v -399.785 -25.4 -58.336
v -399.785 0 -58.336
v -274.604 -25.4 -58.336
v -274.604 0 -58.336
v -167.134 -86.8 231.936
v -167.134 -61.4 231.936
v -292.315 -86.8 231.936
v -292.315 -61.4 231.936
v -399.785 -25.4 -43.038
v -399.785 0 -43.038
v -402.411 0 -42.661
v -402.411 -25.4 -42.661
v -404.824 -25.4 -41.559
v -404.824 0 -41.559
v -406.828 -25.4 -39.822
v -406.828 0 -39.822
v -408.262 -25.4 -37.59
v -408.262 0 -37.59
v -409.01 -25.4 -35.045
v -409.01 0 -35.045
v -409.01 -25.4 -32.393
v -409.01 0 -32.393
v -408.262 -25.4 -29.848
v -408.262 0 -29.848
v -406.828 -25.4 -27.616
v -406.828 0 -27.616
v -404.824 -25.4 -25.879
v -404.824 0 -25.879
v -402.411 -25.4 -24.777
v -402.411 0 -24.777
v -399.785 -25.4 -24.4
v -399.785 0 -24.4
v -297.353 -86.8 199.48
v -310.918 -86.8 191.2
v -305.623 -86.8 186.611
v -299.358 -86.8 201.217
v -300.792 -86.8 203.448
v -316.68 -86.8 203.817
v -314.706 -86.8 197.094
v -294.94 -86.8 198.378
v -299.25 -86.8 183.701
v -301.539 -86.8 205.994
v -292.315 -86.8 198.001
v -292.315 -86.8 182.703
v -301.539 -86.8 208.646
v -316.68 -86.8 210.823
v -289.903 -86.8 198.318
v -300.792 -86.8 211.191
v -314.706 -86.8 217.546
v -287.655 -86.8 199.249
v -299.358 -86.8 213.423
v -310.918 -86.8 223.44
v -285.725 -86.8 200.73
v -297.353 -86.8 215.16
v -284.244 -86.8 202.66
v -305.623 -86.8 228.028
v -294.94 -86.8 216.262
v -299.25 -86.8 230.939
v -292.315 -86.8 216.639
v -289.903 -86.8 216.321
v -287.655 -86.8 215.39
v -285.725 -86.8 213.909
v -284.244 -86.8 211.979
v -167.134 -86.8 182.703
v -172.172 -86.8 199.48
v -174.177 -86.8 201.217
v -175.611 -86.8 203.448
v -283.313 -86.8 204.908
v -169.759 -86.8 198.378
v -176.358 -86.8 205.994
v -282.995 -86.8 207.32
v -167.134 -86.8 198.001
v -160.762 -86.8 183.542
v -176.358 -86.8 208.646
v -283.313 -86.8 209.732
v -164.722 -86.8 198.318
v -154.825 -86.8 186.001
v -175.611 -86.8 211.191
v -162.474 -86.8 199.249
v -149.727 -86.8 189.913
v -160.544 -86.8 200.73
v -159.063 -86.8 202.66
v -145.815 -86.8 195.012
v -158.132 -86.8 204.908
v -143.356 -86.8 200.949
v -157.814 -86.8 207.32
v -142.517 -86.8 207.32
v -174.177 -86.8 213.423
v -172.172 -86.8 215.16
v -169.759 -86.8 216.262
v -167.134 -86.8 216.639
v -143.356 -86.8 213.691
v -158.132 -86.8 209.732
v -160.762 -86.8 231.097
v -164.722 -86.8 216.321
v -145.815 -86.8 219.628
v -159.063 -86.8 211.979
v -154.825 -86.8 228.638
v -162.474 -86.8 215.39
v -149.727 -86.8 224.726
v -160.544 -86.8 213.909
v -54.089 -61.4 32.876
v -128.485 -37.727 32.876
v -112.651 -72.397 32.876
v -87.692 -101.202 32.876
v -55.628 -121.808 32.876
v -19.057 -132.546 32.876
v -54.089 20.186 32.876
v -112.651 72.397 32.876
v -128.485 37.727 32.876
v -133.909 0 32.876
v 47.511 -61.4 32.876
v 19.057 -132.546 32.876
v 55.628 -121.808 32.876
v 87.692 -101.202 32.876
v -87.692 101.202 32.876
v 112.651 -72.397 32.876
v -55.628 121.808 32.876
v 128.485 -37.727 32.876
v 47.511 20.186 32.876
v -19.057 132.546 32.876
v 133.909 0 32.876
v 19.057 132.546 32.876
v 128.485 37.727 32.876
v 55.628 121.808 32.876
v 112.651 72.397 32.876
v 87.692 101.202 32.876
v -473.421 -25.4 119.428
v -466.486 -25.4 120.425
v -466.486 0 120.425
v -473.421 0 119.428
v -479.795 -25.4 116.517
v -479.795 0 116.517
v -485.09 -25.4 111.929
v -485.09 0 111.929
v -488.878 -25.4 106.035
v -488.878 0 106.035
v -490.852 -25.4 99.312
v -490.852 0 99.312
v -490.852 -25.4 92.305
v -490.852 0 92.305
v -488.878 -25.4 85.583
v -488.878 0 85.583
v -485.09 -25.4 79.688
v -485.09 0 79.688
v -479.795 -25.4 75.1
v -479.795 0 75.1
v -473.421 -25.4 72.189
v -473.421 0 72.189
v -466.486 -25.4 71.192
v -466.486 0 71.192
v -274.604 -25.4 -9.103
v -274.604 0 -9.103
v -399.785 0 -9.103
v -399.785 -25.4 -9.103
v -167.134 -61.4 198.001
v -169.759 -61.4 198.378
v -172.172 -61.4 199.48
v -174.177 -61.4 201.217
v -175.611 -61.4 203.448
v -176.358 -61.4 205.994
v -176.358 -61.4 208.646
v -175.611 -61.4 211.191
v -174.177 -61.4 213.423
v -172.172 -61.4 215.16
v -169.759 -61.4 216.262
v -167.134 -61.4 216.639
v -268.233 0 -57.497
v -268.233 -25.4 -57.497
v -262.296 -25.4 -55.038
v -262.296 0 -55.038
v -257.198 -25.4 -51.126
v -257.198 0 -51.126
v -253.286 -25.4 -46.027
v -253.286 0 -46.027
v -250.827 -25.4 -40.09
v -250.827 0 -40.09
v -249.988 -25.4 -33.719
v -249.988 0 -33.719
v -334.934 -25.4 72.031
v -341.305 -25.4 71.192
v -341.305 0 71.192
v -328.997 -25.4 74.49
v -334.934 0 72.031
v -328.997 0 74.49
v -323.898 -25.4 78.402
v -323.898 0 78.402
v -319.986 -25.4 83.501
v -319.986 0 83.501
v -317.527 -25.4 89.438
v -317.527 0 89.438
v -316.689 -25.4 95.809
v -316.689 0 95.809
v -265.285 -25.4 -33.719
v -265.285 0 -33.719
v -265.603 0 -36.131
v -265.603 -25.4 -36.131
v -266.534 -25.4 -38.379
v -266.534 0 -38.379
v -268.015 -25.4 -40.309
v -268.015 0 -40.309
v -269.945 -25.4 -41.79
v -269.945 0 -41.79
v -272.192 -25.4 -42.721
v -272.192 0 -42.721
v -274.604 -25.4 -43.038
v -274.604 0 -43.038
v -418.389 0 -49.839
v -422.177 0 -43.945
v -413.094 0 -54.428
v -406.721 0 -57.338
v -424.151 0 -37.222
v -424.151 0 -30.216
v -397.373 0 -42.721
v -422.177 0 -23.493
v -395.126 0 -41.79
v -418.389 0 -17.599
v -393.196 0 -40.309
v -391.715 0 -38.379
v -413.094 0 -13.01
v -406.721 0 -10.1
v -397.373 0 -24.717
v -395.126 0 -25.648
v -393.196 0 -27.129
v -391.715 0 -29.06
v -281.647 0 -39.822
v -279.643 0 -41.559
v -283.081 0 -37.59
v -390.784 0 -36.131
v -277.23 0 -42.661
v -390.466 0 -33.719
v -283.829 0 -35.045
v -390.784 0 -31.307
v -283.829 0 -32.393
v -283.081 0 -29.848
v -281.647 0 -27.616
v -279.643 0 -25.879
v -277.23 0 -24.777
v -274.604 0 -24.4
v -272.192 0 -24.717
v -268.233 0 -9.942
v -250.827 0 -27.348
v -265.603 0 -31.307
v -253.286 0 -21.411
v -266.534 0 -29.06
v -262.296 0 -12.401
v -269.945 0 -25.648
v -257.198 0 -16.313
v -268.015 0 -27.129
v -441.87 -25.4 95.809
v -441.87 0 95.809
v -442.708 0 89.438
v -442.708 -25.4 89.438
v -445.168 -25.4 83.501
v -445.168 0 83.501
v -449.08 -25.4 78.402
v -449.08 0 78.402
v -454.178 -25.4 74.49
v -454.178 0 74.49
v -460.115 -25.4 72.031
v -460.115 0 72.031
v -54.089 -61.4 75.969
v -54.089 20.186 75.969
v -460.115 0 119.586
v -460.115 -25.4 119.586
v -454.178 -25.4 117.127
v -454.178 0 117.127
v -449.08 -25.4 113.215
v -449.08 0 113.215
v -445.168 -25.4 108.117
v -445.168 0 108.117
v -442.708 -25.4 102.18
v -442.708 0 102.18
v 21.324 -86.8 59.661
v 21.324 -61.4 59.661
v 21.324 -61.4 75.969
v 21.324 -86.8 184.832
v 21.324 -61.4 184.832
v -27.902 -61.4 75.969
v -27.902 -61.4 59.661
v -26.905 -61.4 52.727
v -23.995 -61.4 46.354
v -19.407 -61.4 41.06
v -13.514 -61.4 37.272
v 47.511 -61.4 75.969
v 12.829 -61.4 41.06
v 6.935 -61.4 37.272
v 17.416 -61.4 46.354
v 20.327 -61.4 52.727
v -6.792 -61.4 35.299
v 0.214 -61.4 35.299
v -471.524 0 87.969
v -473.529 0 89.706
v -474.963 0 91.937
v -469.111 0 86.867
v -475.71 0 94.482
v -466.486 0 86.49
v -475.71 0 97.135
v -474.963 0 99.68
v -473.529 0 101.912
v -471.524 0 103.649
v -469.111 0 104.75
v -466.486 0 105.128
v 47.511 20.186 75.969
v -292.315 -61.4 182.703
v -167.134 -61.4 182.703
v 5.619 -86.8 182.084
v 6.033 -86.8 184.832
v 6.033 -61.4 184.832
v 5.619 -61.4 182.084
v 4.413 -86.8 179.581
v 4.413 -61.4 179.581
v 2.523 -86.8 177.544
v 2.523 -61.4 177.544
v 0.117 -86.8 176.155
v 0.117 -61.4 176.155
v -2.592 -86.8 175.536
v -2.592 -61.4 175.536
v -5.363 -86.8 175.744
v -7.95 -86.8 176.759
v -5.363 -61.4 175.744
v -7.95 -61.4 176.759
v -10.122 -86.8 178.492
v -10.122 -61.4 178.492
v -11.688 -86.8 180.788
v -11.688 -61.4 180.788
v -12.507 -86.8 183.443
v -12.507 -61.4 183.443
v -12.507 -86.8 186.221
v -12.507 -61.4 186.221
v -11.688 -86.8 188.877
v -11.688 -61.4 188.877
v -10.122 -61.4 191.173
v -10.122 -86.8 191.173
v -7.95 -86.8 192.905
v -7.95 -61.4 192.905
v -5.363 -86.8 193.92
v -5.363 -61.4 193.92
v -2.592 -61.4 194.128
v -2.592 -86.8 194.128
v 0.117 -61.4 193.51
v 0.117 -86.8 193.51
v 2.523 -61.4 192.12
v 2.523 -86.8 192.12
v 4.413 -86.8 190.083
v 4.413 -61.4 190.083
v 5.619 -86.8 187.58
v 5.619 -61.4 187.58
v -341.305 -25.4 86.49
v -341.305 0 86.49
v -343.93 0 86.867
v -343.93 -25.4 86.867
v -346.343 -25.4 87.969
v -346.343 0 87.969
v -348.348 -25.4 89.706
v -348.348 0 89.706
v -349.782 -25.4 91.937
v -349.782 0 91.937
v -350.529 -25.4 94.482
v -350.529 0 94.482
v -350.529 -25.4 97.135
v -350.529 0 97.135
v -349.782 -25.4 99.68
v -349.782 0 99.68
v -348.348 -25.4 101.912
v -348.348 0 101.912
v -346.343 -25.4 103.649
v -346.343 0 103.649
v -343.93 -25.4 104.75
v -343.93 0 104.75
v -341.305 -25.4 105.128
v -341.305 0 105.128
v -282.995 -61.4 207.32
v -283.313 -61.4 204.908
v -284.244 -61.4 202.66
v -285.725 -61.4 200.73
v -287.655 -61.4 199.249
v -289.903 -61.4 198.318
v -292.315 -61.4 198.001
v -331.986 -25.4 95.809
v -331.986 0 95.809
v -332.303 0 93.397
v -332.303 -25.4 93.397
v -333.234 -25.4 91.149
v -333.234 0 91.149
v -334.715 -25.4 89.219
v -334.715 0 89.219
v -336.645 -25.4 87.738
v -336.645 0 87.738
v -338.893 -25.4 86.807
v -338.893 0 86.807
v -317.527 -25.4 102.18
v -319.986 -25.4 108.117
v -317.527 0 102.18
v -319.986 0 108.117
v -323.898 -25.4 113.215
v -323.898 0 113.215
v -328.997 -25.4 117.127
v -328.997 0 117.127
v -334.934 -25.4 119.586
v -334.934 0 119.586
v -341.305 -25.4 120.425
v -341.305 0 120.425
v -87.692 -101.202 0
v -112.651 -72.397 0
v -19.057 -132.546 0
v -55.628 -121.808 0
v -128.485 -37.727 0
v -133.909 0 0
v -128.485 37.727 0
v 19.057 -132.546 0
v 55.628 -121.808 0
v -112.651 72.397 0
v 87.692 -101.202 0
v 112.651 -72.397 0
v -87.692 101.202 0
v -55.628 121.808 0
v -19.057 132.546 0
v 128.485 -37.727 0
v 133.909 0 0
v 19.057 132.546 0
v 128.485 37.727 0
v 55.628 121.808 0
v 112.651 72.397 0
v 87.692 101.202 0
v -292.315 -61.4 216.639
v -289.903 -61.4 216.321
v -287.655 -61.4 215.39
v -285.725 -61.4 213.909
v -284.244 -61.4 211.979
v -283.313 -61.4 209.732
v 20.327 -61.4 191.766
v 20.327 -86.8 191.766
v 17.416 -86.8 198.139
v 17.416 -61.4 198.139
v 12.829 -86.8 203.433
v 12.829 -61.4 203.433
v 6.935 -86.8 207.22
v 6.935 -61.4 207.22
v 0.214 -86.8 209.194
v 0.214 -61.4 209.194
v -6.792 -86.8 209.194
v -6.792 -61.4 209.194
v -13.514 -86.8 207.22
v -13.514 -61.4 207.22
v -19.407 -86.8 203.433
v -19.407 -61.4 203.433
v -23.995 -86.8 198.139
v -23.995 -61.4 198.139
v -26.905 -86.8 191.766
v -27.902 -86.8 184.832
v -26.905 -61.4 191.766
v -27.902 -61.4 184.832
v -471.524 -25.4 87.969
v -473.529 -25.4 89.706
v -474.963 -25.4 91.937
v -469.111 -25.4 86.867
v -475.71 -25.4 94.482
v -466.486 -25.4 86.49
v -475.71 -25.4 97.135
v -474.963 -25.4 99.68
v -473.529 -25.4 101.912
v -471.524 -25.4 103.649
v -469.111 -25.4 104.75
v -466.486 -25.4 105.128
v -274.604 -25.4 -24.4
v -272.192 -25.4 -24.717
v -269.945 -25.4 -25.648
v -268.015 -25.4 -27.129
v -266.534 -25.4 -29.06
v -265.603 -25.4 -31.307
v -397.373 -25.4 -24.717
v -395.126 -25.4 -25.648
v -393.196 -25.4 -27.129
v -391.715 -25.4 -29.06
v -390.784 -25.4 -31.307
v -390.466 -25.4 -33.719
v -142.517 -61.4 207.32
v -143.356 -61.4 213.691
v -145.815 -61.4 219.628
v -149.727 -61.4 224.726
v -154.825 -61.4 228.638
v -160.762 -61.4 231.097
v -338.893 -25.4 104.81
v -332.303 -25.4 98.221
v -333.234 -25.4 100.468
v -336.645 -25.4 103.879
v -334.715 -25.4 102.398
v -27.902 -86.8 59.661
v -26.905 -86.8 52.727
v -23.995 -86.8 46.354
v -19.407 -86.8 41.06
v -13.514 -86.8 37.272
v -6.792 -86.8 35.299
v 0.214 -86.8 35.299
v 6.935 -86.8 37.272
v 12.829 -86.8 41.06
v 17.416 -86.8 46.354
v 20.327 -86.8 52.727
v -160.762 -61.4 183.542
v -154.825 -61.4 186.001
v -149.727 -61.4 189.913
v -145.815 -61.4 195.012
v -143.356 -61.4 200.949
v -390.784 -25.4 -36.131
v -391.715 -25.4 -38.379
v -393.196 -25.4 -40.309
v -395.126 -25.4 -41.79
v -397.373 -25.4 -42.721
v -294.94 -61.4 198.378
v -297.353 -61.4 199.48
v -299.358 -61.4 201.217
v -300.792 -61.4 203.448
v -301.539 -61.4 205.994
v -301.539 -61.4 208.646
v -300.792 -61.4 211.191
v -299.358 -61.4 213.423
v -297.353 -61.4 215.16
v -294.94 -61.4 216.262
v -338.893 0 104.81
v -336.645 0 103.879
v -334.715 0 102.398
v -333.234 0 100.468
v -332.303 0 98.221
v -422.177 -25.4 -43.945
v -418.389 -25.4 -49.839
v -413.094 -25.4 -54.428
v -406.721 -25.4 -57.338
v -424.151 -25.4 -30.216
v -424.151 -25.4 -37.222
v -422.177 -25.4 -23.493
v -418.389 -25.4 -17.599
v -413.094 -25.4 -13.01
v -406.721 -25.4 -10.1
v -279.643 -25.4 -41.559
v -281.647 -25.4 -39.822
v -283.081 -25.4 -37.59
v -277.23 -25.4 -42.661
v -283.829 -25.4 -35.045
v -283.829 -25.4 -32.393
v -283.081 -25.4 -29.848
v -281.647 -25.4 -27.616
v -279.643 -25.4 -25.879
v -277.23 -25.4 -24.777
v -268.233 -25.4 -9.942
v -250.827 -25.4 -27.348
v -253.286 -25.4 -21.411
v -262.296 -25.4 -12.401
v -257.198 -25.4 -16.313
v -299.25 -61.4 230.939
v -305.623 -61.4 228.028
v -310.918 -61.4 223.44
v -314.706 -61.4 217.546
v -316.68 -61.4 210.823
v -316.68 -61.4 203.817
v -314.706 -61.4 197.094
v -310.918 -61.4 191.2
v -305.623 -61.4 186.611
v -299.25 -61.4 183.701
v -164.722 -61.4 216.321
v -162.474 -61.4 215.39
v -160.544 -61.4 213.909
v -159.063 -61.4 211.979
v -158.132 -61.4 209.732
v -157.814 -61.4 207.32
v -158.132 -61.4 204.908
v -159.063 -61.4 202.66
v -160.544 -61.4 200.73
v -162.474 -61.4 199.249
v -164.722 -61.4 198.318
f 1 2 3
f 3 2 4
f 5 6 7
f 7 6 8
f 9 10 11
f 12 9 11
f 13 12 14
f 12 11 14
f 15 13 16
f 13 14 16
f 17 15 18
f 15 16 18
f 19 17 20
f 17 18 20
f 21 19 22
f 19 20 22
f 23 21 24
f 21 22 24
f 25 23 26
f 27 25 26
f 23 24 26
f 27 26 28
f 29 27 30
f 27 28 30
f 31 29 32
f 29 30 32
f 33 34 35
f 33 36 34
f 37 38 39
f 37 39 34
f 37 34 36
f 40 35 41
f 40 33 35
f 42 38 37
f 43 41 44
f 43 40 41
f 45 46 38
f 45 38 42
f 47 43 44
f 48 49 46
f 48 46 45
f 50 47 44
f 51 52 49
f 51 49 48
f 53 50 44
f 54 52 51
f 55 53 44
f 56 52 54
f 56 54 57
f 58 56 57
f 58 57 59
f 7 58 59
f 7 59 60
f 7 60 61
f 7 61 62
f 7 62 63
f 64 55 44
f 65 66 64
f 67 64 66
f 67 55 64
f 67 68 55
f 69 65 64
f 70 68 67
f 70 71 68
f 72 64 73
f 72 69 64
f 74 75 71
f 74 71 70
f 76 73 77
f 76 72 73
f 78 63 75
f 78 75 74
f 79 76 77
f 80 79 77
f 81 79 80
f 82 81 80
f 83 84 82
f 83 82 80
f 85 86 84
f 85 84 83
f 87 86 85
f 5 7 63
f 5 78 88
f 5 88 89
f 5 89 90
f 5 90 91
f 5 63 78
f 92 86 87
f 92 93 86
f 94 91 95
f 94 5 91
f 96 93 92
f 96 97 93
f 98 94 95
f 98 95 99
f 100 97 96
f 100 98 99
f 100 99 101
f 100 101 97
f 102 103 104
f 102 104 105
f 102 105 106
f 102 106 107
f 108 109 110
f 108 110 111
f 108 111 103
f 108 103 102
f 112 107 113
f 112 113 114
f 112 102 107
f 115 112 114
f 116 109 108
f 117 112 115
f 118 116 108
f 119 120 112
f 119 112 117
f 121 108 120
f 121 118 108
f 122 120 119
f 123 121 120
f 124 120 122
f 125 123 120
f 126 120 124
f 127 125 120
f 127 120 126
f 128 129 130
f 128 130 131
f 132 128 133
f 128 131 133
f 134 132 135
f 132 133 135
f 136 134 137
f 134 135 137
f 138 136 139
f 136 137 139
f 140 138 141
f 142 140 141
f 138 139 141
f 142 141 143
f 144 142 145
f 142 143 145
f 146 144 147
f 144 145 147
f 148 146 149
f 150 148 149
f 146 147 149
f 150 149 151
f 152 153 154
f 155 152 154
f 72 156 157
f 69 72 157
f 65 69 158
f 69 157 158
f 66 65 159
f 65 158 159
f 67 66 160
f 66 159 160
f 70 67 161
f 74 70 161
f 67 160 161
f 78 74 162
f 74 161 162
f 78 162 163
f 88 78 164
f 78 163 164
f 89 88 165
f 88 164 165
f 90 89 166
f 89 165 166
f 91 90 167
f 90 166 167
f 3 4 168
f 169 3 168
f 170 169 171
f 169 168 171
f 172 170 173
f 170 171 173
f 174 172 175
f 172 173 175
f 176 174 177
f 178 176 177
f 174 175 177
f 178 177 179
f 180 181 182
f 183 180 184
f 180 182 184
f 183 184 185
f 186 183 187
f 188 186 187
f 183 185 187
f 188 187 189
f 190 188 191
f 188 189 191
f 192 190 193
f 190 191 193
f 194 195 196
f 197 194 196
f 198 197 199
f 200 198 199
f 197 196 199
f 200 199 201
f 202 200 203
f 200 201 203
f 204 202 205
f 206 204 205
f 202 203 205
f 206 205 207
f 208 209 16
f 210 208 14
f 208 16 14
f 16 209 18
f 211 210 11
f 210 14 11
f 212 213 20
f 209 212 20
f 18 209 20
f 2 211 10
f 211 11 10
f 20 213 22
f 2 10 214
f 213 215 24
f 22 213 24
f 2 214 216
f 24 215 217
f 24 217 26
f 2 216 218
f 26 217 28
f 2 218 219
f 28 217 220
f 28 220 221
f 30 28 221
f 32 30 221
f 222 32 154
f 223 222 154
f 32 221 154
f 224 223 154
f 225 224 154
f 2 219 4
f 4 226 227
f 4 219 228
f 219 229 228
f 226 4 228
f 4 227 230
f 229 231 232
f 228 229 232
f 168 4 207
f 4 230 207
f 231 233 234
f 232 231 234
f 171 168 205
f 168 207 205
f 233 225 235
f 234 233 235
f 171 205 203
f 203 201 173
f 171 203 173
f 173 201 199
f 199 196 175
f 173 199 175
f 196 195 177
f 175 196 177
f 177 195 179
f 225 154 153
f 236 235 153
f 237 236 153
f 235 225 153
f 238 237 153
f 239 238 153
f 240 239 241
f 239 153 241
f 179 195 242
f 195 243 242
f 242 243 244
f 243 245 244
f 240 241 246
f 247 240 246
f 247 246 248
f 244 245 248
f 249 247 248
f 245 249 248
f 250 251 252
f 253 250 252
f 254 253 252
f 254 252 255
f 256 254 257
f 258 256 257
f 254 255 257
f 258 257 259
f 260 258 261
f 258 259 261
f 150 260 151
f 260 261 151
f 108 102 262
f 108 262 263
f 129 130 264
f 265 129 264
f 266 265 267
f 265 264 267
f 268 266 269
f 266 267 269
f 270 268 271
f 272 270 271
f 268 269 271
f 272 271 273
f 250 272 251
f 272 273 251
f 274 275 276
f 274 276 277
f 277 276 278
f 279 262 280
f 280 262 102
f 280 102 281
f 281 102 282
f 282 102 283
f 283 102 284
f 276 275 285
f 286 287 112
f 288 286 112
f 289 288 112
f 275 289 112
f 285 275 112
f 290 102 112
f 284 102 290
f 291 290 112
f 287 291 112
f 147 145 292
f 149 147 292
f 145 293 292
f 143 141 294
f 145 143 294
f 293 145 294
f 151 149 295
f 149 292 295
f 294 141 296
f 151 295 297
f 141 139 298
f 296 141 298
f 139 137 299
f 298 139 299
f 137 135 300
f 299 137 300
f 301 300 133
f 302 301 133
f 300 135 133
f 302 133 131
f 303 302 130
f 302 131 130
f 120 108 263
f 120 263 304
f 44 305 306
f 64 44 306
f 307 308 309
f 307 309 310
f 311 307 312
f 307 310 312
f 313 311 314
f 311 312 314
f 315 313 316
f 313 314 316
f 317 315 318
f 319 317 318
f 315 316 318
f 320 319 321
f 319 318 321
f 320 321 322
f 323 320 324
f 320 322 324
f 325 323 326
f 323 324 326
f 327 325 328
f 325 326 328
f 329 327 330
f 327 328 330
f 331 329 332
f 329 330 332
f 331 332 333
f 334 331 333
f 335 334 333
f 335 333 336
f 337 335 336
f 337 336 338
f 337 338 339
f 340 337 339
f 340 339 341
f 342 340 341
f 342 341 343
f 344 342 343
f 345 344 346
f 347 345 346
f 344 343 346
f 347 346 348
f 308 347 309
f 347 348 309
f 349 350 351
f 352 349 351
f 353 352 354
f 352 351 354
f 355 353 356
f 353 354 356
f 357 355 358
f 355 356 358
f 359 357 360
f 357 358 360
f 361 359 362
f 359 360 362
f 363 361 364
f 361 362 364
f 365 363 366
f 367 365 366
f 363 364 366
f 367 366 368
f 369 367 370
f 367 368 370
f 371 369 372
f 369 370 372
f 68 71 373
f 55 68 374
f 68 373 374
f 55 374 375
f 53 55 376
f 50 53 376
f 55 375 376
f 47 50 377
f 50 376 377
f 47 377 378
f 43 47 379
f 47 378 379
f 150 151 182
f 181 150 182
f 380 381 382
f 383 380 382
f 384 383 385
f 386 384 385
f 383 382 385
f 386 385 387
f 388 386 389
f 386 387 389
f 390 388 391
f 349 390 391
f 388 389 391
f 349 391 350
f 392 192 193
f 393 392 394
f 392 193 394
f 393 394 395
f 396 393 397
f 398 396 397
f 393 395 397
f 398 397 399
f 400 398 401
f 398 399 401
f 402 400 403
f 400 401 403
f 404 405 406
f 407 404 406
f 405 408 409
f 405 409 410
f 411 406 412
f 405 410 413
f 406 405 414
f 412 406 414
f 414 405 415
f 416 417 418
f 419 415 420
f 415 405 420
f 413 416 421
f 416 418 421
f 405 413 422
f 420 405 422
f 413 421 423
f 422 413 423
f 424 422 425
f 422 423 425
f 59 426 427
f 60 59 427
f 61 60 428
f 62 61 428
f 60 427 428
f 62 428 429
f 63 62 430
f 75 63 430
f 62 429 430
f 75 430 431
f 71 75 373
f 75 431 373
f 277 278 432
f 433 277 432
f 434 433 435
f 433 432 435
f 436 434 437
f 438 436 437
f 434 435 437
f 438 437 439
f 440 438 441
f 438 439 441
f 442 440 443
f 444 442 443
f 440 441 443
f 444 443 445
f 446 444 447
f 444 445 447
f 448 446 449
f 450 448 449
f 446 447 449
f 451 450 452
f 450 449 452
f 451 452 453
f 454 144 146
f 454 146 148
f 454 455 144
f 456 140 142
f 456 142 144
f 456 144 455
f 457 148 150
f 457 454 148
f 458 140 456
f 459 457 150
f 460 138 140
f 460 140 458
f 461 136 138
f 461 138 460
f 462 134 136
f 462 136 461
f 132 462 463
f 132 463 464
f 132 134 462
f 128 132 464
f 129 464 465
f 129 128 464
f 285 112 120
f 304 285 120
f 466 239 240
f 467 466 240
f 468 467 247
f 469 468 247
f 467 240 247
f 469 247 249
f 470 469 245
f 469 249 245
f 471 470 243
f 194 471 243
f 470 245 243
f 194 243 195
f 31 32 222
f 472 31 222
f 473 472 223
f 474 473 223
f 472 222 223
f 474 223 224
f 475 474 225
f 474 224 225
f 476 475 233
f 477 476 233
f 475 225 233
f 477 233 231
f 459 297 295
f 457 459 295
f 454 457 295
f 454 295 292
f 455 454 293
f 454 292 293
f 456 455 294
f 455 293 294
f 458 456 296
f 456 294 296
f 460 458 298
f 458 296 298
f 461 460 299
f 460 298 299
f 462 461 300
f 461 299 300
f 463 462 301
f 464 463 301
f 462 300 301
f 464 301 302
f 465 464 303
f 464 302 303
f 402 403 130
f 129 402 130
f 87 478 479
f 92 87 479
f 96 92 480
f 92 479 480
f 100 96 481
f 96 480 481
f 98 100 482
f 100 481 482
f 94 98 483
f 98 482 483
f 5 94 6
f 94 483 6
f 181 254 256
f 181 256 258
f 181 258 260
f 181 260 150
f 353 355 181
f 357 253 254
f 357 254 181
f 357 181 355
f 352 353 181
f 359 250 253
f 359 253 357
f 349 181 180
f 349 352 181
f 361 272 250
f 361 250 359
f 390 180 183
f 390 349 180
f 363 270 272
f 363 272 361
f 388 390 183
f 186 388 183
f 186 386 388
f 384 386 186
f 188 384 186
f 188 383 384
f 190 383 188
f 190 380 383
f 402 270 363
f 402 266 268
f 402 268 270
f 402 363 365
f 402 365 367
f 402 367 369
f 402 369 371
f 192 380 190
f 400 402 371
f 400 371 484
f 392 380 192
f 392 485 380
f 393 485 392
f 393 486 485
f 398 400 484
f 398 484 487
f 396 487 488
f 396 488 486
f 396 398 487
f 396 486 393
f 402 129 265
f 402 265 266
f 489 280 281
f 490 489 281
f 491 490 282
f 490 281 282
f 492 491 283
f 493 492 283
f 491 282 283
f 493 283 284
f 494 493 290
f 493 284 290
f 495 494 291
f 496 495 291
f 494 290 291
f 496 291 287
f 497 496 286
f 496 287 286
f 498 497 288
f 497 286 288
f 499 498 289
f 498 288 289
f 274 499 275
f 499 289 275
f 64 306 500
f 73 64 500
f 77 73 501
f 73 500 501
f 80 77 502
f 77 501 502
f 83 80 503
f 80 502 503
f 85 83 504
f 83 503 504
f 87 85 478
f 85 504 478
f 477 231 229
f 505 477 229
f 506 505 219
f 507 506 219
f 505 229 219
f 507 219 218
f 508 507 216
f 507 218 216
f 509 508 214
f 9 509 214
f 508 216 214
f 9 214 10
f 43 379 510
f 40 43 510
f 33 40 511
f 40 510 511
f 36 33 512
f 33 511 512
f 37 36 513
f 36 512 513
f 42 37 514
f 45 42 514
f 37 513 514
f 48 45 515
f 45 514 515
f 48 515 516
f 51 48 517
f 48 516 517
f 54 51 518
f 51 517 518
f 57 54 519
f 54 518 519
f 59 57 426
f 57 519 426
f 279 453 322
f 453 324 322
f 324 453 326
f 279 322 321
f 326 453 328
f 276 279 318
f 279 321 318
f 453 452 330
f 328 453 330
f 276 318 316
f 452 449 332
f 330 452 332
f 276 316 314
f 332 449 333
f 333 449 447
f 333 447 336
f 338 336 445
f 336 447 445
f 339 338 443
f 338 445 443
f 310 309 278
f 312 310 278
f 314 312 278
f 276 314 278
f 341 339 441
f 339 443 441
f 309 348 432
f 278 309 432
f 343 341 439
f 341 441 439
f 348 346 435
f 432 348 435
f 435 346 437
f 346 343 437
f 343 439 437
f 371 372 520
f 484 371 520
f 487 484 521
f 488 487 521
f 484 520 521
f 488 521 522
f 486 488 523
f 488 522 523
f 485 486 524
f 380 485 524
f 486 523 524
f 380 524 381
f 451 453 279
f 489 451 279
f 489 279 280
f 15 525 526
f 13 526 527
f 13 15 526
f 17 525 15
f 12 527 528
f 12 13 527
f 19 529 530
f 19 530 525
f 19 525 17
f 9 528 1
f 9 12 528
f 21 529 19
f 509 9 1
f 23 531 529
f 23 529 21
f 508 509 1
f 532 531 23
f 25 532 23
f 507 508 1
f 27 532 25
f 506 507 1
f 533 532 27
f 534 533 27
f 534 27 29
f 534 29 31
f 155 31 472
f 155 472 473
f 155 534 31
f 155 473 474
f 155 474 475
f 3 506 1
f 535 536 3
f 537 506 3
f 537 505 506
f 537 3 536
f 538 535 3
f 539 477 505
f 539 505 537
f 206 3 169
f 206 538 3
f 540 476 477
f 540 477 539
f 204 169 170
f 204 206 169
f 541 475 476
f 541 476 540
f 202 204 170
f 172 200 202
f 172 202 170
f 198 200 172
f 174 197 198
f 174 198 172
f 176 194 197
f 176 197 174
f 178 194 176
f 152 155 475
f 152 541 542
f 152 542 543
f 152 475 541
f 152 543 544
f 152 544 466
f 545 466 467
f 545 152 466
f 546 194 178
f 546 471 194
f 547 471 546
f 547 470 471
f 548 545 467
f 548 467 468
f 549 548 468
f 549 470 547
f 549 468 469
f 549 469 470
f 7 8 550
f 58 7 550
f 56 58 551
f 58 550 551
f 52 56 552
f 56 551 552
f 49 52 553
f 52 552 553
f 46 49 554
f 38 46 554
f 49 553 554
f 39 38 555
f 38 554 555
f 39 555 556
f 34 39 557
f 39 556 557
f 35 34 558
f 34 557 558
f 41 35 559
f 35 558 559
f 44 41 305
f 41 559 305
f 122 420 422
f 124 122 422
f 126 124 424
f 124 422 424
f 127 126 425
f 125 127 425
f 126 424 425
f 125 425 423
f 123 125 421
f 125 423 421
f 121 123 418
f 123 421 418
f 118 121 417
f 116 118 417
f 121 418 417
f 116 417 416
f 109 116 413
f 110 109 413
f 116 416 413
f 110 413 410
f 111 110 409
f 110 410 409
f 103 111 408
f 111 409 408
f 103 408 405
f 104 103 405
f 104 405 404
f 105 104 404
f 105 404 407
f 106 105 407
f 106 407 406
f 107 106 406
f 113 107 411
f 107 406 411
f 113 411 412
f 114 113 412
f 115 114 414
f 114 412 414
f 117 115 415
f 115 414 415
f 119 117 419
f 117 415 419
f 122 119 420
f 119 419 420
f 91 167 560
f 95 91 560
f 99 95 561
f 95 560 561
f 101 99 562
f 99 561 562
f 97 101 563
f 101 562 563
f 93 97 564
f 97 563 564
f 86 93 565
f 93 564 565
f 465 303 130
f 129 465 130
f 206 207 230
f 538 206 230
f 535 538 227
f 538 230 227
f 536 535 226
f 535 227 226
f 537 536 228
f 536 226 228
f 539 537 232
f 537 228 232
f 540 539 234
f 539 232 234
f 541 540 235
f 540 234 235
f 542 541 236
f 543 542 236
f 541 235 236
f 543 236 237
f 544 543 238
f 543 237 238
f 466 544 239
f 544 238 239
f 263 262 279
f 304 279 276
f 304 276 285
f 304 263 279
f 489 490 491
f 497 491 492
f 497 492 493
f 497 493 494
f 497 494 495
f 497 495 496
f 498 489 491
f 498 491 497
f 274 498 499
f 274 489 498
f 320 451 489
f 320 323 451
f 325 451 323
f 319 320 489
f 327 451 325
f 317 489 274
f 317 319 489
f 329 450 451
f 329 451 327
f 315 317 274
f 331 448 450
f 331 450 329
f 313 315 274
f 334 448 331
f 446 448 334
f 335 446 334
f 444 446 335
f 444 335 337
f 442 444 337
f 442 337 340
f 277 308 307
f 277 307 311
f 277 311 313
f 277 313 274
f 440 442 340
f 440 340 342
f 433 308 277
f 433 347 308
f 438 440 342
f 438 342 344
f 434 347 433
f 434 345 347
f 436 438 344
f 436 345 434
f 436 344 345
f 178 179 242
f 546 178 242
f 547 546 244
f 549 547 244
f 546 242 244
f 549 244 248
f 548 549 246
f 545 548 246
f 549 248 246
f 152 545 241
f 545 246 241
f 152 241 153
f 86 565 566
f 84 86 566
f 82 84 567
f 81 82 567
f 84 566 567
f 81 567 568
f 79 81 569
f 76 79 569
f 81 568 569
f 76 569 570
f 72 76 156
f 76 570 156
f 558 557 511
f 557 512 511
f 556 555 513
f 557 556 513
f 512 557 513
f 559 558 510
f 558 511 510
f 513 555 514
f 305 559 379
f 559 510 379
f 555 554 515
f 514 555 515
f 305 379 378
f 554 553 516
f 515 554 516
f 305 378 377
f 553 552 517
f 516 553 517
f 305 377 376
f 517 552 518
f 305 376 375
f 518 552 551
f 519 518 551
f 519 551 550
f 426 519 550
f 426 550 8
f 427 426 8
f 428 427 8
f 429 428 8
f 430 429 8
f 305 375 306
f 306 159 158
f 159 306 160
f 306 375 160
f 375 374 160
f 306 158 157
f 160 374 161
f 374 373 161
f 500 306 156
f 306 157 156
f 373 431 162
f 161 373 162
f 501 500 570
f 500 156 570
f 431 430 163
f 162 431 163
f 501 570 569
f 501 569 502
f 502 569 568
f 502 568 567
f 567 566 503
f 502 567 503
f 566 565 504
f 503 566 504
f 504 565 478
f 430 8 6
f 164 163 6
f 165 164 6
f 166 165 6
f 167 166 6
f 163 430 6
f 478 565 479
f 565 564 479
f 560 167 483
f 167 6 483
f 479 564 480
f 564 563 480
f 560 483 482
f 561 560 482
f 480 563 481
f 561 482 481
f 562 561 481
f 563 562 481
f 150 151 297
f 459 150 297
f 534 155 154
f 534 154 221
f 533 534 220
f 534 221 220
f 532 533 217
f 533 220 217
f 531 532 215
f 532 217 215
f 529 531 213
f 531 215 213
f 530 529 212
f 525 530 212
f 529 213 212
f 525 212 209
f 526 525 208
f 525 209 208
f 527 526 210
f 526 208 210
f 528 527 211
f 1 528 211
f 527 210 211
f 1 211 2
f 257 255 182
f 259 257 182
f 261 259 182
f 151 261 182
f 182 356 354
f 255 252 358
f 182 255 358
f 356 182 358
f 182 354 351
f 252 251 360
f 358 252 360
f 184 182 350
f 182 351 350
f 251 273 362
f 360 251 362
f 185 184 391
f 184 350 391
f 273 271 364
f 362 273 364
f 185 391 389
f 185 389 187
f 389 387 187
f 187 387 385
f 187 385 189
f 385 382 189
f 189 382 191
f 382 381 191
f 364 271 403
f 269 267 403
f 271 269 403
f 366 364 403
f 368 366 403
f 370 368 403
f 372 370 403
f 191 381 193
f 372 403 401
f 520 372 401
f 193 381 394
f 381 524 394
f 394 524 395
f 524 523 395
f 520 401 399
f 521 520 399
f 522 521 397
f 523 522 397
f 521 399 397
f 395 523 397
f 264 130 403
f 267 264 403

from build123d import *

# Parameters (mm, degrees)
F1_DEPTH = 25.4
F2_R     = 133.9090353396
F3_DEPTH = 32.8763
F4_W     = 101.6
F4_H     = 81.5856331369
F5_DEPTH = 43.0923
F7_DEPTH = 25.4


with BuildPart() as f1:
    # F0 (on Front) → F1 (new body)
    with BuildSketch(Plane.XZ):
        with BuildLine():
            ThreePointArc((-375.1689102501, -33.7191261351), (-382.3788868172, -16.3127029223), (-399.78531003, -9.1027263552))
            Line((-399.78531003, -9.1027263552), (-399.78531003, -24.3999422365))
            ThreePointArc((-399.78531003, -24.3999422365), (-393.1956519002, -27.1294680053), (-390.4661261314, -33.7191261351))
            ThreePointArc((-390.4661261314, -33.7191261351), (-393.1956519002, -40.3087842649), (-399.78531003, -43.0383100337))
            Line((-399.78531003, -43.0383100337), (-399.78531003, -58.335525915))
            ThreePointArc((-399.78531003, -58.335525915), (-382.3788868172, -51.1255493479), (-375.1689102501, -33.7191261351))
        make_face()
        with BuildLine():
            Line((-274.6042609215, -9.1027263552), (-399.78531003, -9.1027263552))
            ThreePointArc((-399.78531003, -9.1027263552), (-382.3788868172, -16.3127029223), (-375.1689102501, -33.7191261351))
            ThreePointArc((-375.1689102501, -33.7191261351), (-382.3788868172, -51.1255493479), (-399.78531003, -58.335525915))
            Line((-399.78531003, -58.335525915), (-274.6042609215, -58.335525915))
            ThreePointArc((-274.6042609215, -58.335525915), (-299.2206607014, -33.7191261351), (-274.6042609215, -9.1027263552))
        make_face()
        with BuildLine():
            Line((-399.78531003, -24.3999422365), (-399.78531003, -9.1027263552))
            ThreePointArc((-399.78531003, -9.1027263552), (-424.4017098099, -33.7191261351), (-399.78531003, -58.335525915))
            Line((-399.78531003, -58.335525915), (-399.78531003, -43.0383100337))
            ThreePointArc((-399.78531003, -43.0383100337), (-409.1044939286, -33.7191261351), (-399.78531003, -24.3999422365))
        make_face()
        with BuildLine():
            ThreePointArc((-249.9878611416, -33.7191261351), (-257.1978377087, -16.3127029223), (-274.6042609215, -9.1027263552))
            Line((-274.6042609215, -9.1027263552), (-274.6042609215, -24.3999422365))
            ThreePointArc((-274.6042609215, -24.3999422365), (-268.0146027917, -27.1294680053), (-265.2850770229, -33.7191261351))
            ThreePointArc((-265.2850770229, -33.7191261351), (-268.0146027917, -40.3087842649), (-274.6042609215, -43.0383100337))
            Line((-274.6042609215, -43.0383100337), (-274.6042609215, -58.335525915))
            ThreePointArc((-274.6042609215, -58.335525915), (-257.1978377087, -51.1255493479), (-249.9878611416, -33.7191261351))
        make_face()
        with BuildLine():
            Line((-274.6042609215, -24.3999422365), (-274.6042609215, -9.1027263552))
            ThreePointArc((-274.6042609215, -9.1027263552), (-299.2206607014, -33.7191261351), (-274.6042609215, -58.335525915))
            Line((-274.6042609215, -58.335525915), (-274.6042609215, -43.0383100337))
            ThreePointArc((-274.6042609215, -43.0383100337), (-283.9234448201, -33.7191261351), (-274.6042609215, -24.3999422365))
        make_face()
    extrude(amount=F1_DEPTH)


with BuildPart() as f1b:
    # F0 (on Front) → F1, piece 2 (new body)
    with BuildSketch(Plane.XZ):
        with BuildLine():
            Line((-341.3049131632, 120.4251348972), (-466.4859622717, 120.4251348972))
            ThreePointArc((-466.4859622717, 120.4251348972), (-449.0795390589, 113.2151583301), (-441.8695624918, 95.8087351173))
            ThreePointArc((-441.8695624918, 95.8087351173), (-449.0795390589, 78.4023119045), (-466.4859622717, 71.1923353374))
            Line((-466.4859622717, 71.1923353374), (-341.3049131632, 71.1923353374))
            ThreePointArc((-341.3049131632, 71.1923353374), (-365.9213129431, 95.8087351173), (-341.3049131632, 120.4251348972))
        make_face()
        with BuildLine():
            ThreePointArc((-316.6885133833, 95.8087351173), (-323.8984899504, 113.2151583301), (-341.3049131632, 120.4251348972))
            Line((-341.3049131632, 120.4251348972), (-341.3049131632, 105.1279190159))
            ThreePointArc((-341.3049131632, 105.1279190159), (-334.7152550334, 102.3983932471), (-331.9857292646, 95.8087351173))
            ThreePointArc((-331.9857292646, 95.8087351173), (-334.7152550334, 89.2190769875), (-341.3049131632, 86.4895512187))
            Line((-341.3049131632, 86.4895512187), (-341.3049131632, 71.1923353374))
            ThreePointArc((-341.3049131632, 71.1923353374), (-323.8984899504, 78.4023119045), (-316.6885133833, 95.8087351173))
        make_face()
        with BuildLine():
            Line((-341.3049131632, 105.1279190159), (-341.3049131632, 120.4251348972))
            ThreePointArc((-341.3049131632, 120.4251348972), (-365.9213129431, 95.8087351173), (-341.3049131632, 71.1923353374))
            Line((-341.3049131632, 71.1923353374), (-341.3049131632, 86.4895512187))
            ThreePointArc((-341.3049131632, 86.4895512187), (-350.6240970618, 95.8087351173), (-341.3049131632, 105.1279190159))
        make_face()
    extrude(amount=F1_DEPTH)


with BuildPart() as f1c:
    # F0 (on Front) → F1, piece 3 (new body)
    with BuildSketch(Plane.XZ):
        with BuildLine():
            Line((-466.4859622717, 105.1279190159), (-466.4859622717, 120.4251348972))
            ThreePointArc((-466.4859622717, 120.4251348972), (-491.1023620516, 95.8087351173), (-466.4859622717, 71.1923353374))
            Line((-466.4859622717, 71.1923353374), (-466.4859622717, 86.4895512187))
            ThreePointArc((-466.4859622717, 86.4895512187), (-475.8051461703, 95.8087351173), (-466.4859622717, 105.1279190159))
        make_face()
    extrude(amount=F1_DEPTH)


with BuildPart() as f3:
    # F2 (on Top) → F3 (new body)
    with BuildSketch(Plane.XY):
        Circle(F2_R)
    extrude(amount=F3_DEPTH)

    # F4 (on face) → F5 (join)
    with BuildSketch(Plane.XY.offset(32.8763)):
        with Locations((-3.2890904695, -20.6068744883)):
            Rectangle(F4_W, F4_H)
    extrude(amount=F5_DEPTH)

    # F6 (on face) → F7, piece 2 (join)
    with BuildSketch(Plane.XZ.offset(61.3996910568)):
        with BuildLine():
            Line((6.0327095305, 184.8320817577), (21.3235095305, 184.8320817577))
            ThreePointArc((21.3235095305, 184.8320817577), (-3.2890904695, 209.4446817577), (-27.9016904695, 184.8320817577))
            Line((-27.9016904695, 184.8320817577), (-12.6108904695, 184.8320817577))
            ThreePointArc((-12.6108904695, 184.8320817577), (-3.2890904695, 194.1538817577), (6.0327095305, 184.8320817577))
        make_face()
        with BuildLine():
            ThreePointArc((-27.9016904695, 184.8320817577), (-3.2890904695, 160.2194817577), (21.3235095305, 184.8320817577))
            Line((21.3235095305, 184.8320817577), (6.0327095305, 184.8320817577))
            ThreePointArc((6.0327095305, 184.8320817577), (-3.2890904695, 175.5102817577), (-12.6108904695, 184.8320817577))
            Line((-12.6108904695, 184.8320817577), (-27.9016904695, 184.8320817577))
        make_face()
        with BuildLine():
            Line((-21.7237969898, 75.9686), (15.1456160509, 75.9686))
            ThreePointArc((15.1456160509, 75.9686), (-3.2890904695, 84.2734817577), (-21.7237969898, 75.9686))
        make_face()
        with BuildLine():
            Line((-27.9016904695, 75.9686), (-27.9016904695, 59.6608817577))
            ThreePointArc((-27.9016904695, 59.6608817577), (-26.3054556958, 68.3802286673), (-21.7237969898, 75.9686))
            Line((-21.7237969898, 75.9686), (-27.9016904695, 75.9686))
        make_face()
        with BuildLine():
            ThreePointArc((15.1456160509, 75.9686), (19.7272747568, 68.3802286673), (21.3235095305, 59.6608817577))
            Line((21.3235095305, 59.6608817577), (21.3235095305, 75.9686))
            Line((21.3235095305, 75.9686), (15.1456160509, 75.9686))
        make_face()
        with BuildLine():
            ThreePointArc((-12.6108904695, 59.6608817577), (-3.2890904695, 68.9826817577), (6.0327095305, 59.6608817577))
            Line((6.0327095305, 59.6608817577), (21.3235095305, 59.6608817577))
            ThreePointArc((21.3235095305, 59.6608817577), (19.7272747568, 68.3802286673), (15.1456160509, 75.9686))
            Line((15.1456160509, 75.9686), (-21.7237969898, 75.9686))
            ThreePointArc((-21.7237969898, 75.9686), (-26.3054556958, 68.3802286673), (-27.9016904695, 59.6608817577))
            Line((-27.9016904695, 59.6608817577), (-12.6108904695, 59.6608817577))
        make_face()
        with BuildLine():
            Line((15.1456160509, 75.9686), (21.3235095305, 75.9686))
            Line((21.3235095305, 75.9686), (21.3235095305, 184.8320817577))
            ThreePointArc((21.3235095305, 184.8320817577), (-3.2890904695, 160.2194817577), (-27.9016904695, 184.8320817577))
            Line((-27.9016904695, 184.8320817577), (-27.9016904695, 75.9686))
            Line((-27.9016904695, 75.9686), (-21.7237969898, 75.9686))
            ThreePointArc((-21.7237969898, 75.9686), (-3.2890904695, 84.2734817577), (15.1456160509, 75.9686))
        make_face()
        with BuildLine():
            Line((21.3235095305, 59.6608817577), (6.0327095305, 59.6608817577))
            ThreePointArc((6.0327095305, 59.6608817577), (-3.2890904695, 50.3390817577), (-12.6108904695, 59.6608817577))
            Line((-12.6108904695, 59.6608817577), (-27.9016904695, 59.6608817577))
            ThreePointArc((-27.9016904695, 59.6608817577), (-3.2890904695, 35.0482817577), (21.3235095305, 59.6608817577))
        make_face()
        with BuildLine():
            Line((-12.6108904695, 59.6608817577), (6.0327095305, 59.6608817577))
            ThreePointArc((6.0327095305, 59.6608817577), (-3.2890904695, 68.9826817577), (-12.6108904695, 59.6608817577))
        make_face()
        with BuildLine():
            ThreePointArc((-12.6108904695, 59.6608817577), (-3.2890904695, 50.3390817577), (6.0327095305, 59.6608817577))
            Line((6.0327095305, 59.6608817577), (-12.6108904695, 59.6608817577))
        make_face()
    extrude(amount=F7_DEPTH)


with BuildPart() as f7:
    # F6 (on face) → F7 (new body)
    with BuildSketch(Plane.XZ.offset(61.3996910568)):
        with BuildLine():
            ThreePointArc((-292.314581573, 198.0006345385), (-301.6337654716, 207.3198184371), (-292.314581573, 216.6390023357))
            Line((-292.314581573, 216.6390023357), (-292.314581573, 231.936218217))
            ThreePointArc((-292.314581573, 231.936218217), (-316.9309813529, 207.3198184371), (-292.314581573, 182.7034186572))
            Line((-292.314581573, 182.7034186572), (-292.314581573, 198.0006345385))
        make_face()
        with BuildLine():
            Line((-167.1335324645, 231.936218217), (-292.314581573, 231.936218217))
            ThreePointArc((-292.314581573, 231.936218217), (-274.9081583602, 224.7262416499), (-267.6981817931, 207.3198184371))
            ThreePointArc((-267.6981817931, 207.3198184371), (-274.9081583602, 189.9133952243), (-292.314581573, 182.7034186572))
            Line((-292.314581573, 182.7034186572), (-167.1335324645, 182.7034186572))
            ThreePointArc((-167.1335324645, 182.7034186572), (-191.7499322444, 207.3198184371), (-167.1335324645, 231.936218217))
        make_face()
        with BuildLine():
            ThreePointArc((-142.5171326846, 207.3198184371), (-149.7271092517, 224.7262416499), (-167.1335324645, 231.936218217))
            Line((-167.1335324645, 231.936218217), (-167.1335324645, 216.6390023357))
            ThreePointArc((-167.1335324645, 216.6390023357), (-160.5438743347, 213.9094765669), (-157.8143485659, 207.3198184371))
            ThreePointArc((-157.8143485659, 207.3198184371), (-160.5438743347, 200.7301603073), (-167.1335324645, 198.0006345385))
            Line((-167.1335324645, 198.0006345385), (-167.1335324645, 182.7034186572))
            ThreePointArc((-167.1335324645, 182.7034186572), (-149.7271092517, 189.9133952243), (-142.5171326846, 207.3198184371))
        make_face()
        with BuildLine():
            ThreePointArc((-292.314581573, 216.6390023357), (-285.7249234432, 213.9094765669), (-282.9953976744, 207.3198184371))
            ThreePointArc((-282.9953976744, 207.3198184371), (-285.7249234432, 200.7301603073), (-292.314581573, 198.0006345385))
            Line((-292.314581573, 198.0006345385), (-292.314581573, 182.7034186572))
            ThreePointArc((-292.314581573, 182.7034186572), (-274.9081583602, 189.9133952243), (-267.6981817931, 207.3198184371))
            ThreePointArc((-267.6981817931, 207.3198184371), (-274.9081583602, 224.7262416499), (-292.314581573, 231.936218217))
            Line((-292.314581573, 231.936218217), (-292.314581573, 216.6390023357))
        make_face()
        with BuildLine():
            Line((-167.1335324645, 216.6390023357), (-167.1335324645, 231.936218217))
            ThreePointArc((-167.1335324645, 231.936218217), (-191.7499322444, 207.3198184371), (-167.1335324645, 182.7034186572))
            Line((-167.1335324645, 182.7034186572), (-167.1335324645, 198.0006345385))
            ThreePointArc((-167.1335324645, 198.0006345385), (-176.4527163631, 207.3198184371), (-167.1335324645, 216.6390023357))
        make_face()
    extrude(amount=F7_DEPTH)


solid = Compound([f1.part, f1b.part, f1c.part, f3.part, f7.part])
